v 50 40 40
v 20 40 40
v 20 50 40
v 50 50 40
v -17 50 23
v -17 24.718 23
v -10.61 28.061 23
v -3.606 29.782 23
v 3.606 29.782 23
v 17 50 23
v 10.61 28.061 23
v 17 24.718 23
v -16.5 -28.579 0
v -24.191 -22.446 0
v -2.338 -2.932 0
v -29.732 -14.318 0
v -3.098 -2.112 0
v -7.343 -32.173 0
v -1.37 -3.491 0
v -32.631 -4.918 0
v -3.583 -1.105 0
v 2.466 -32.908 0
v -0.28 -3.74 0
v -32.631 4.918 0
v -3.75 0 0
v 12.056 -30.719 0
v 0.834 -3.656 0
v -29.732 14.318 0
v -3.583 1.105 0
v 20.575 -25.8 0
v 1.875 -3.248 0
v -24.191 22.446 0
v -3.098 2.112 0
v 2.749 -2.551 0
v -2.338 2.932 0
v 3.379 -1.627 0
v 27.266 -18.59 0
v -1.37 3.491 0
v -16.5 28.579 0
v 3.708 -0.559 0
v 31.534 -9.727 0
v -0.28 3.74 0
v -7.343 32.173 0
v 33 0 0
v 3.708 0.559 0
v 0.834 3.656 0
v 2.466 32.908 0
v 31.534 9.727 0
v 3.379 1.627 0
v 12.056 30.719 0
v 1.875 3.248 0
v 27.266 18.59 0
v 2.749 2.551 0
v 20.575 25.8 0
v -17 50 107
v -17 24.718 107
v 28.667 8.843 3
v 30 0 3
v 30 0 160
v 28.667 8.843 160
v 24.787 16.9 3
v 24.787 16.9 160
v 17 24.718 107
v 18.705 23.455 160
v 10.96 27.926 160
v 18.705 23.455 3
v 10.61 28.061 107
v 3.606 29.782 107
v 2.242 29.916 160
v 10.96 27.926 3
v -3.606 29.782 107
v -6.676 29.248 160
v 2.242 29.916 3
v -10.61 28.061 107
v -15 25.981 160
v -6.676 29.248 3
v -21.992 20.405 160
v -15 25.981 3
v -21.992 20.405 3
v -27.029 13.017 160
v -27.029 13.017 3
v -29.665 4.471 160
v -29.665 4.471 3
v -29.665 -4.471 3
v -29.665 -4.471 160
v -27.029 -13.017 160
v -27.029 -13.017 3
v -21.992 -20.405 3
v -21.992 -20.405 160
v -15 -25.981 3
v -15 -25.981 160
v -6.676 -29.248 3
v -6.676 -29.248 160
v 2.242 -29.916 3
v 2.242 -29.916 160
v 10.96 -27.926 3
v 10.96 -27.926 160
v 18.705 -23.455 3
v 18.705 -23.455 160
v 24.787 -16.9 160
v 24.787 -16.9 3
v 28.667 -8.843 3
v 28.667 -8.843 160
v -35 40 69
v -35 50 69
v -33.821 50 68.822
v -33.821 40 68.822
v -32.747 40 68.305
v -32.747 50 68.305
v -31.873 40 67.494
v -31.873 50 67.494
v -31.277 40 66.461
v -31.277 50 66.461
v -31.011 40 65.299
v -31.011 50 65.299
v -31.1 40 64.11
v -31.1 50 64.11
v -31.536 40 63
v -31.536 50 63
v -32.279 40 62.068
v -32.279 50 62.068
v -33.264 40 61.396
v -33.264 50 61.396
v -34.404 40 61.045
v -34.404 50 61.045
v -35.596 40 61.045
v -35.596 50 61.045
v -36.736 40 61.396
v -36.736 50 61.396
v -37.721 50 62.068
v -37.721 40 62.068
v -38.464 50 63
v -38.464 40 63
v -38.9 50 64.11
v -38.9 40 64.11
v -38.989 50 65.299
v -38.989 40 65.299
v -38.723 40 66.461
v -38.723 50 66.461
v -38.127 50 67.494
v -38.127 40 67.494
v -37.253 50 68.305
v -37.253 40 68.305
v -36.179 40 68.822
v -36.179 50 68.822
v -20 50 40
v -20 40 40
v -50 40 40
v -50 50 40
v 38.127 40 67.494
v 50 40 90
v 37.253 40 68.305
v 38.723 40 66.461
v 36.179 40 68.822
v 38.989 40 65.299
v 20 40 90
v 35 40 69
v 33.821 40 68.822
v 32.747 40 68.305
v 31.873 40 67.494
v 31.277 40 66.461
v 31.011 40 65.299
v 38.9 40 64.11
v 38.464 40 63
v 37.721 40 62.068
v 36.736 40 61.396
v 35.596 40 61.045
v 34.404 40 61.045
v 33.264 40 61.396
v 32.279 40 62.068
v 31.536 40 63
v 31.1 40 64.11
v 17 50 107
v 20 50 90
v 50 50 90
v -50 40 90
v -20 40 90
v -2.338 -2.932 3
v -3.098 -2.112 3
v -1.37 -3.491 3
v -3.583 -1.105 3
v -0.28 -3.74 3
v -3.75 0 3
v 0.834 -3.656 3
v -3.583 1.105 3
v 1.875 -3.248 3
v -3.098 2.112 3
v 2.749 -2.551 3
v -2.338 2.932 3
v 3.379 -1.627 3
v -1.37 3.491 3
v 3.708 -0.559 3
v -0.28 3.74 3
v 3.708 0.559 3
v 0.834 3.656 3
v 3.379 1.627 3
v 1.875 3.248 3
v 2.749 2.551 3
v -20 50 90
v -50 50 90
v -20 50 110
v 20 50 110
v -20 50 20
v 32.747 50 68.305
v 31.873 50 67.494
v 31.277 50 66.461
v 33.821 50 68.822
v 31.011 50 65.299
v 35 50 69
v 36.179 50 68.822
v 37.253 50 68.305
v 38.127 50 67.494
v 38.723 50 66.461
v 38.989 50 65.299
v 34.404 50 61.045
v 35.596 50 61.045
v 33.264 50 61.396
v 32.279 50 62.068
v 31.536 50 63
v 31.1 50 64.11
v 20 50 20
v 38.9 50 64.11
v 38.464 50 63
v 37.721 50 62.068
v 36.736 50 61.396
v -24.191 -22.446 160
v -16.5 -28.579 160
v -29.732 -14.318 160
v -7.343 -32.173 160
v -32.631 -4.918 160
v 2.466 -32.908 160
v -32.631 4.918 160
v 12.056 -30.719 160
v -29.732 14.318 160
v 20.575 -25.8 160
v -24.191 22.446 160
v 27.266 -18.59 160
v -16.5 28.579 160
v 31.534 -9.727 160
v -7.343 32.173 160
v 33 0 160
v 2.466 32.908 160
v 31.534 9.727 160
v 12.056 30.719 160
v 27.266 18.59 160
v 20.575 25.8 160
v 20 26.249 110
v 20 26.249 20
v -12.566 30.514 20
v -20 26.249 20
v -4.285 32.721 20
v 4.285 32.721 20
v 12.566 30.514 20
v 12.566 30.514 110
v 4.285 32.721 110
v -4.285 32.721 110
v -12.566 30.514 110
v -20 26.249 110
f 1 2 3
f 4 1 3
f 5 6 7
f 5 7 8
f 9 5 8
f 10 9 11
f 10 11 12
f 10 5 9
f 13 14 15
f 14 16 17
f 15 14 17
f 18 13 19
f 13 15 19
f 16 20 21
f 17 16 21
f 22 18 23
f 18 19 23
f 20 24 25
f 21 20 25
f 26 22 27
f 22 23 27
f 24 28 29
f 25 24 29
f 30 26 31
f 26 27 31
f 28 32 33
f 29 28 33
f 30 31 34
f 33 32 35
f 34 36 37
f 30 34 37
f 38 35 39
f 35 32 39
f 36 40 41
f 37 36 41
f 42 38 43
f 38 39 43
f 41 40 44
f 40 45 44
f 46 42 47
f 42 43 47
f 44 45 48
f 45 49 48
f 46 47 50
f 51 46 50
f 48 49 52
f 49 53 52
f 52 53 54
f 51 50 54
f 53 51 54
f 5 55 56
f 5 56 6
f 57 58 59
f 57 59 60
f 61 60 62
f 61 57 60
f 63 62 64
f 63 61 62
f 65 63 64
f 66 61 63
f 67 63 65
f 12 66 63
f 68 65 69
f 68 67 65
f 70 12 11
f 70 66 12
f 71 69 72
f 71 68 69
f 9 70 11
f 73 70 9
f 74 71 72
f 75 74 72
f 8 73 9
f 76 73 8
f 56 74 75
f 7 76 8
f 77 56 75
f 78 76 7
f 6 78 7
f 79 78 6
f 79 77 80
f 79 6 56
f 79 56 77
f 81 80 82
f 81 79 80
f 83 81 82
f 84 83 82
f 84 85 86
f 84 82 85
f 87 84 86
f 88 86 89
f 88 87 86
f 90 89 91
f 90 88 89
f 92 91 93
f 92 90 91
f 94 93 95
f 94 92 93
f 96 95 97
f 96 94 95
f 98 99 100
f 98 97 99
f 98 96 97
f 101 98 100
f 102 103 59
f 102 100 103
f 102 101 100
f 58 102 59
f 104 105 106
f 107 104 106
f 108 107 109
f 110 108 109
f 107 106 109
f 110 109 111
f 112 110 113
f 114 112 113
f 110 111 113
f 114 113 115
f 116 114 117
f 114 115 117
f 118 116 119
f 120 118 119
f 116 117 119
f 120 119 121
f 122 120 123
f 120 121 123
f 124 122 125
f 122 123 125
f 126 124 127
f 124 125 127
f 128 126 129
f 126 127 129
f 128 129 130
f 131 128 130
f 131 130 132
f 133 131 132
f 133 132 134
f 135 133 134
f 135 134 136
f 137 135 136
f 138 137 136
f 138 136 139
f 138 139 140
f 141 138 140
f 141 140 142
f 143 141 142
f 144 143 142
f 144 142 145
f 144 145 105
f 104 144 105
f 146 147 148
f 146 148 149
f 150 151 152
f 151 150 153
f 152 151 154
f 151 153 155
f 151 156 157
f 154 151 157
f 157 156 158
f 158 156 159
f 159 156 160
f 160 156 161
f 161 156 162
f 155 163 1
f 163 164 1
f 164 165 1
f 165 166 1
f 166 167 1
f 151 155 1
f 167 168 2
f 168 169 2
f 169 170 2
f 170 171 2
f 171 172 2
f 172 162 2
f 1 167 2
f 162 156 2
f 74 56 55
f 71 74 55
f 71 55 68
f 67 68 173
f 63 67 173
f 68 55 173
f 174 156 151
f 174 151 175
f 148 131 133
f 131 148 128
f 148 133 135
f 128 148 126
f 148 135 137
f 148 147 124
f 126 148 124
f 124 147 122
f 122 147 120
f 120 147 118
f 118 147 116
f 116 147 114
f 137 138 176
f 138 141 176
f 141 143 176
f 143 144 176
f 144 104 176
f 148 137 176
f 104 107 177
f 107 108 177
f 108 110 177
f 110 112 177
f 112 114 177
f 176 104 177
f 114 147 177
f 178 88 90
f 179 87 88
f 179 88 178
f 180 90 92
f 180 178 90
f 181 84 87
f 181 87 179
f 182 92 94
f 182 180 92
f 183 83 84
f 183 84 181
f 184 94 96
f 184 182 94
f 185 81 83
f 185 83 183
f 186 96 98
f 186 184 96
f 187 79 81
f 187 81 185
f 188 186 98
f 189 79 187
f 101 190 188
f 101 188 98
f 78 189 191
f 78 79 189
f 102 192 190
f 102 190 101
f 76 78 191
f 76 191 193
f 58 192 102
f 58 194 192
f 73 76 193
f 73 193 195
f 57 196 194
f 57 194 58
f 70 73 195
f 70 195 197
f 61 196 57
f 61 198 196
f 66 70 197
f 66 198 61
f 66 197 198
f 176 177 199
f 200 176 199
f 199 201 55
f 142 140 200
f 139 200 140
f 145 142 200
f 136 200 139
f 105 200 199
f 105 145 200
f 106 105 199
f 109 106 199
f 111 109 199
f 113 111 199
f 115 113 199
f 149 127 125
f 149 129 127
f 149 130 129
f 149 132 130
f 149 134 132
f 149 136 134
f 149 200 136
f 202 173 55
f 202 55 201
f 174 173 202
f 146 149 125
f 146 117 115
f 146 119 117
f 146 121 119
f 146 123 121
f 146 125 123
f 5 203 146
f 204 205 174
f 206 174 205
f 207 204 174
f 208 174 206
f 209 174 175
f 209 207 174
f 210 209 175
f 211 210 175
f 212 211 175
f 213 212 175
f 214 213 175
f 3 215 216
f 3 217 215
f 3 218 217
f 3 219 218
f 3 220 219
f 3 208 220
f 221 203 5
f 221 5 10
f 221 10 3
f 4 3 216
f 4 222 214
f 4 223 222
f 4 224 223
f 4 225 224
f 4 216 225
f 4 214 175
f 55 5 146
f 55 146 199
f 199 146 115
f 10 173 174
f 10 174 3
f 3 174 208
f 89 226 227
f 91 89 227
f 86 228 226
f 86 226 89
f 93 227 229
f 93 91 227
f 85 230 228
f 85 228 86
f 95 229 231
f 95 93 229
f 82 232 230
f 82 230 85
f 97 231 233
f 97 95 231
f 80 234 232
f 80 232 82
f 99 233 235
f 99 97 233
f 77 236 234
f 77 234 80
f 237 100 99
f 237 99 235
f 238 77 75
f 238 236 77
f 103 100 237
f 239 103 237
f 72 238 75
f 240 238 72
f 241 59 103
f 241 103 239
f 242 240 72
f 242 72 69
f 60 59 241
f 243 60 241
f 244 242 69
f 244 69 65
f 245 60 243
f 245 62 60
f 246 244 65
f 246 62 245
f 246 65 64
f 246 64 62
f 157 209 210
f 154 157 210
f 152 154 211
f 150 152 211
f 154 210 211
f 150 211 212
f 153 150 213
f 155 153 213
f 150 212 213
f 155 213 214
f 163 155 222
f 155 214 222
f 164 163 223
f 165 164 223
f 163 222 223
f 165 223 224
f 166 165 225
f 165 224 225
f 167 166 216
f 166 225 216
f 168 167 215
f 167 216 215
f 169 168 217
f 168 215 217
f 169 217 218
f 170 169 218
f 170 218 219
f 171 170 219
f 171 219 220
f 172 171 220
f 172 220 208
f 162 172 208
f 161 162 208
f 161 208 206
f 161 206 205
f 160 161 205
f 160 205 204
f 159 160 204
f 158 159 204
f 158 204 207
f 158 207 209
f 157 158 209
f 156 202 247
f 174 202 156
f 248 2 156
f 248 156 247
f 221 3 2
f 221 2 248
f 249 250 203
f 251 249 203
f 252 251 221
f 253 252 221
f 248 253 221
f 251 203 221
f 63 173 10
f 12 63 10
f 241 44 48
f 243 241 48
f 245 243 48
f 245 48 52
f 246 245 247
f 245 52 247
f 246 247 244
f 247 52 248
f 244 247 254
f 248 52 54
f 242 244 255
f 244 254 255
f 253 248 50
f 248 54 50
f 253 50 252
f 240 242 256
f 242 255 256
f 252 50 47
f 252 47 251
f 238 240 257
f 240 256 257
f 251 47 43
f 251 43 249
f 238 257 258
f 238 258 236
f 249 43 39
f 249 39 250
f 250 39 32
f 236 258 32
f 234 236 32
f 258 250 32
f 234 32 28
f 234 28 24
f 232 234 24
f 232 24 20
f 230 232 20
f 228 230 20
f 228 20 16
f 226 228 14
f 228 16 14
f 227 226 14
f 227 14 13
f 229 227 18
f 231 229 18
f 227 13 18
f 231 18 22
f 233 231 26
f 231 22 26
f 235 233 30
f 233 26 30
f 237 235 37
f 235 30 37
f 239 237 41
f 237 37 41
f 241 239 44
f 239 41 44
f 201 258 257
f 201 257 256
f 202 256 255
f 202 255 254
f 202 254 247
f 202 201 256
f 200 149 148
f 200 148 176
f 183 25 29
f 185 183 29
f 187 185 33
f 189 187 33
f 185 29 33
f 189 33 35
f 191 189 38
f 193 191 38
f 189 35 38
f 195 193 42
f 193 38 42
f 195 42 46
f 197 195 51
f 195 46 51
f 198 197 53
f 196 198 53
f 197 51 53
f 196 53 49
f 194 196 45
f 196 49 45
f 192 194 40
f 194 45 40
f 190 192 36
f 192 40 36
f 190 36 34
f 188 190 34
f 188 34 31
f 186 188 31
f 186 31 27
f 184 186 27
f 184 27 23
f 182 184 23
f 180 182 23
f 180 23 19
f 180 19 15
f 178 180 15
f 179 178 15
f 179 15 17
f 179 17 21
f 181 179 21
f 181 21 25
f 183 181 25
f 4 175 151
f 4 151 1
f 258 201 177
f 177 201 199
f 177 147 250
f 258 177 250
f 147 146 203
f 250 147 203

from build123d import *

# Parameters (mm, degrees)
SKETCH_1_R           = 33
EXTRUDE_1_DEPTH      = 160
SHELL_1_T            = -3
EXTRUDE_2_REACH      = 185.243
EXTRUDE_2_END_RADIUS = 33
SKETCH_2_W           = 40
SKETCH_2_H           = 90
SKETCH_3_W           = 34
SKETCH_3_H           = 84
CUT_EXTRUDE_1_DEPTH  = 60
SKETCH_4_W           = 50
SKETCH_4_H           = 10
EXTRUDE_3_DEPTH      = 30
SKETCH_5_R           = 4
CUT_EXTRUDE_2_DEPTH  = 30
SKETCH_6_W           = 50
SKETCH_6_H           = 10
EXTRUDE_4_DEPTH      = 30
SKETCH_7_R           = 4
CUT_EXTRUDE_3_DEPTH  = 30
SKETCH_8_R           = 3.75
CUT_EXTRUDE_4_DEPTH  = 10


with BuildPart() as part:
    # 草图1 → 凸台-拉伸1 (new body)
    with BuildSketch(Plane.XY):
        Circle(SKETCH_1_R)
    extrude(amount=EXTRUDE_1_DEPTH)

    # 抽壳1
    shell_1_openings = [part.faces().sort_by_distance(p)[0] for p in [
        (0, 0, 160),
    ]]
    offset(amount=SHELL_1_T, openings=shell_1_openings, kind=Kind.INTERSECTION)

    # 凸台-拉伸2: up to this cylinder (the profile starts outside it)
    extrude_2_end = Plane(origin=(0, 0, 65), z_dir=(0, 0, -1)) * Cylinder(EXTRUDE_2_END_RADIUS, 437.486, mode=Mode.PRIVATE)
    # 草图2 → 凸台-拉伸2 (add, up to the surface)
    with BuildSketch(Plane(origin=(0, 50, 0), x_dir=(1, 0, 0), z_dir=(0, 1, 0)), mode=Mode.PRIVATE) as extrude_2_sk1:
        with Locations((0, -65)):
            Rectangle(SKETCH_2_W, SKETCH_2_H)
    extrude_2_tool1 = extrude(extrude_2_sk1.sketch, amount=-EXTRUDE_2_REACH, mode=Mode.PRIVATE) - extrude_2_end
    add(extrude_2_tool1.solids().sort_by_distance((0, 50, 65))[0])

    # 草图3 → 切除-拉伸1 (cut)
    with BuildSketch(Plane(origin=(0, 50, 0), x_dir=(1, 0, 0), z_dir=(0, 1, 0))):
        with Locations((0, -65)):
            Rectangle(SKETCH_3_W, SKETCH_3_H)
    extrude(amount=-CUT_EXTRUDE_1_DEPTH, mode=Mode.SUBTRACT)

    # 草图4 → 凸台-拉伸3 (add)
    with BuildSketch(Plane.ZY.offset(20)):
        with Locations((65, 45)):
            Rectangle(SKETCH_4_W, SKETCH_4_H)
    extrude(amount=EXTRUDE_3_DEPTH)

    # 草图5 → 切除-拉伸2 (cut)
    with BuildSketch(Plane(origin=(0, 50, 0), x_dir=(1, 0, 0), z_dir=(0, 1, 0))):
        with Locations(Location((-35, -65, 0), (0, 0, 270))):
            Circle(SKETCH_5_R)
    extrude(amount=-CUT_EXTRUDE_2_DEPTH, mode=Mode.SUBTRACT)

    # 草图6 → 凸台-拉伸4 (add)
    with BuildSketch(Plane(origin=(20, 0, 0), x_dir=(0, 0, -1), z_dir=(1, 0, 0))):
        with Locations((-65, 45)):
            Rectangle(SKETCH_6_W, SKETCH_6_H)
    extrude(amount=EXTRUDE_4_DEPTH)

    # 草图7 → 切除-拉伸3 (cut)
    with BuildSketch(Plane(origin=(0, 50, 0), x_dir=(1, 0, 0), z_dir=(0, 1, 0))):
        with Locations(Location((35, -65, 0), (0, 0, 270))):
            Circle(SKETCH_7_R)
    extrude(amount=-CUT_EXTRUDE_3_DEPTH, mode=Mode.SUBTRACT)

    # 草图8 → 切除-拉伸4 (cut)
    with BuildSketch(Plane(origin=(0, 0, 0), x_dir=(-1, 0, 0), z_dir=(0, 0, -1))):
        Circle(SKETCH_8_R)
    extrude(amount=-CUT_EXTRUDE_4_DEPTH, mode=Mode.SUBTRACT)


solid = part.part
